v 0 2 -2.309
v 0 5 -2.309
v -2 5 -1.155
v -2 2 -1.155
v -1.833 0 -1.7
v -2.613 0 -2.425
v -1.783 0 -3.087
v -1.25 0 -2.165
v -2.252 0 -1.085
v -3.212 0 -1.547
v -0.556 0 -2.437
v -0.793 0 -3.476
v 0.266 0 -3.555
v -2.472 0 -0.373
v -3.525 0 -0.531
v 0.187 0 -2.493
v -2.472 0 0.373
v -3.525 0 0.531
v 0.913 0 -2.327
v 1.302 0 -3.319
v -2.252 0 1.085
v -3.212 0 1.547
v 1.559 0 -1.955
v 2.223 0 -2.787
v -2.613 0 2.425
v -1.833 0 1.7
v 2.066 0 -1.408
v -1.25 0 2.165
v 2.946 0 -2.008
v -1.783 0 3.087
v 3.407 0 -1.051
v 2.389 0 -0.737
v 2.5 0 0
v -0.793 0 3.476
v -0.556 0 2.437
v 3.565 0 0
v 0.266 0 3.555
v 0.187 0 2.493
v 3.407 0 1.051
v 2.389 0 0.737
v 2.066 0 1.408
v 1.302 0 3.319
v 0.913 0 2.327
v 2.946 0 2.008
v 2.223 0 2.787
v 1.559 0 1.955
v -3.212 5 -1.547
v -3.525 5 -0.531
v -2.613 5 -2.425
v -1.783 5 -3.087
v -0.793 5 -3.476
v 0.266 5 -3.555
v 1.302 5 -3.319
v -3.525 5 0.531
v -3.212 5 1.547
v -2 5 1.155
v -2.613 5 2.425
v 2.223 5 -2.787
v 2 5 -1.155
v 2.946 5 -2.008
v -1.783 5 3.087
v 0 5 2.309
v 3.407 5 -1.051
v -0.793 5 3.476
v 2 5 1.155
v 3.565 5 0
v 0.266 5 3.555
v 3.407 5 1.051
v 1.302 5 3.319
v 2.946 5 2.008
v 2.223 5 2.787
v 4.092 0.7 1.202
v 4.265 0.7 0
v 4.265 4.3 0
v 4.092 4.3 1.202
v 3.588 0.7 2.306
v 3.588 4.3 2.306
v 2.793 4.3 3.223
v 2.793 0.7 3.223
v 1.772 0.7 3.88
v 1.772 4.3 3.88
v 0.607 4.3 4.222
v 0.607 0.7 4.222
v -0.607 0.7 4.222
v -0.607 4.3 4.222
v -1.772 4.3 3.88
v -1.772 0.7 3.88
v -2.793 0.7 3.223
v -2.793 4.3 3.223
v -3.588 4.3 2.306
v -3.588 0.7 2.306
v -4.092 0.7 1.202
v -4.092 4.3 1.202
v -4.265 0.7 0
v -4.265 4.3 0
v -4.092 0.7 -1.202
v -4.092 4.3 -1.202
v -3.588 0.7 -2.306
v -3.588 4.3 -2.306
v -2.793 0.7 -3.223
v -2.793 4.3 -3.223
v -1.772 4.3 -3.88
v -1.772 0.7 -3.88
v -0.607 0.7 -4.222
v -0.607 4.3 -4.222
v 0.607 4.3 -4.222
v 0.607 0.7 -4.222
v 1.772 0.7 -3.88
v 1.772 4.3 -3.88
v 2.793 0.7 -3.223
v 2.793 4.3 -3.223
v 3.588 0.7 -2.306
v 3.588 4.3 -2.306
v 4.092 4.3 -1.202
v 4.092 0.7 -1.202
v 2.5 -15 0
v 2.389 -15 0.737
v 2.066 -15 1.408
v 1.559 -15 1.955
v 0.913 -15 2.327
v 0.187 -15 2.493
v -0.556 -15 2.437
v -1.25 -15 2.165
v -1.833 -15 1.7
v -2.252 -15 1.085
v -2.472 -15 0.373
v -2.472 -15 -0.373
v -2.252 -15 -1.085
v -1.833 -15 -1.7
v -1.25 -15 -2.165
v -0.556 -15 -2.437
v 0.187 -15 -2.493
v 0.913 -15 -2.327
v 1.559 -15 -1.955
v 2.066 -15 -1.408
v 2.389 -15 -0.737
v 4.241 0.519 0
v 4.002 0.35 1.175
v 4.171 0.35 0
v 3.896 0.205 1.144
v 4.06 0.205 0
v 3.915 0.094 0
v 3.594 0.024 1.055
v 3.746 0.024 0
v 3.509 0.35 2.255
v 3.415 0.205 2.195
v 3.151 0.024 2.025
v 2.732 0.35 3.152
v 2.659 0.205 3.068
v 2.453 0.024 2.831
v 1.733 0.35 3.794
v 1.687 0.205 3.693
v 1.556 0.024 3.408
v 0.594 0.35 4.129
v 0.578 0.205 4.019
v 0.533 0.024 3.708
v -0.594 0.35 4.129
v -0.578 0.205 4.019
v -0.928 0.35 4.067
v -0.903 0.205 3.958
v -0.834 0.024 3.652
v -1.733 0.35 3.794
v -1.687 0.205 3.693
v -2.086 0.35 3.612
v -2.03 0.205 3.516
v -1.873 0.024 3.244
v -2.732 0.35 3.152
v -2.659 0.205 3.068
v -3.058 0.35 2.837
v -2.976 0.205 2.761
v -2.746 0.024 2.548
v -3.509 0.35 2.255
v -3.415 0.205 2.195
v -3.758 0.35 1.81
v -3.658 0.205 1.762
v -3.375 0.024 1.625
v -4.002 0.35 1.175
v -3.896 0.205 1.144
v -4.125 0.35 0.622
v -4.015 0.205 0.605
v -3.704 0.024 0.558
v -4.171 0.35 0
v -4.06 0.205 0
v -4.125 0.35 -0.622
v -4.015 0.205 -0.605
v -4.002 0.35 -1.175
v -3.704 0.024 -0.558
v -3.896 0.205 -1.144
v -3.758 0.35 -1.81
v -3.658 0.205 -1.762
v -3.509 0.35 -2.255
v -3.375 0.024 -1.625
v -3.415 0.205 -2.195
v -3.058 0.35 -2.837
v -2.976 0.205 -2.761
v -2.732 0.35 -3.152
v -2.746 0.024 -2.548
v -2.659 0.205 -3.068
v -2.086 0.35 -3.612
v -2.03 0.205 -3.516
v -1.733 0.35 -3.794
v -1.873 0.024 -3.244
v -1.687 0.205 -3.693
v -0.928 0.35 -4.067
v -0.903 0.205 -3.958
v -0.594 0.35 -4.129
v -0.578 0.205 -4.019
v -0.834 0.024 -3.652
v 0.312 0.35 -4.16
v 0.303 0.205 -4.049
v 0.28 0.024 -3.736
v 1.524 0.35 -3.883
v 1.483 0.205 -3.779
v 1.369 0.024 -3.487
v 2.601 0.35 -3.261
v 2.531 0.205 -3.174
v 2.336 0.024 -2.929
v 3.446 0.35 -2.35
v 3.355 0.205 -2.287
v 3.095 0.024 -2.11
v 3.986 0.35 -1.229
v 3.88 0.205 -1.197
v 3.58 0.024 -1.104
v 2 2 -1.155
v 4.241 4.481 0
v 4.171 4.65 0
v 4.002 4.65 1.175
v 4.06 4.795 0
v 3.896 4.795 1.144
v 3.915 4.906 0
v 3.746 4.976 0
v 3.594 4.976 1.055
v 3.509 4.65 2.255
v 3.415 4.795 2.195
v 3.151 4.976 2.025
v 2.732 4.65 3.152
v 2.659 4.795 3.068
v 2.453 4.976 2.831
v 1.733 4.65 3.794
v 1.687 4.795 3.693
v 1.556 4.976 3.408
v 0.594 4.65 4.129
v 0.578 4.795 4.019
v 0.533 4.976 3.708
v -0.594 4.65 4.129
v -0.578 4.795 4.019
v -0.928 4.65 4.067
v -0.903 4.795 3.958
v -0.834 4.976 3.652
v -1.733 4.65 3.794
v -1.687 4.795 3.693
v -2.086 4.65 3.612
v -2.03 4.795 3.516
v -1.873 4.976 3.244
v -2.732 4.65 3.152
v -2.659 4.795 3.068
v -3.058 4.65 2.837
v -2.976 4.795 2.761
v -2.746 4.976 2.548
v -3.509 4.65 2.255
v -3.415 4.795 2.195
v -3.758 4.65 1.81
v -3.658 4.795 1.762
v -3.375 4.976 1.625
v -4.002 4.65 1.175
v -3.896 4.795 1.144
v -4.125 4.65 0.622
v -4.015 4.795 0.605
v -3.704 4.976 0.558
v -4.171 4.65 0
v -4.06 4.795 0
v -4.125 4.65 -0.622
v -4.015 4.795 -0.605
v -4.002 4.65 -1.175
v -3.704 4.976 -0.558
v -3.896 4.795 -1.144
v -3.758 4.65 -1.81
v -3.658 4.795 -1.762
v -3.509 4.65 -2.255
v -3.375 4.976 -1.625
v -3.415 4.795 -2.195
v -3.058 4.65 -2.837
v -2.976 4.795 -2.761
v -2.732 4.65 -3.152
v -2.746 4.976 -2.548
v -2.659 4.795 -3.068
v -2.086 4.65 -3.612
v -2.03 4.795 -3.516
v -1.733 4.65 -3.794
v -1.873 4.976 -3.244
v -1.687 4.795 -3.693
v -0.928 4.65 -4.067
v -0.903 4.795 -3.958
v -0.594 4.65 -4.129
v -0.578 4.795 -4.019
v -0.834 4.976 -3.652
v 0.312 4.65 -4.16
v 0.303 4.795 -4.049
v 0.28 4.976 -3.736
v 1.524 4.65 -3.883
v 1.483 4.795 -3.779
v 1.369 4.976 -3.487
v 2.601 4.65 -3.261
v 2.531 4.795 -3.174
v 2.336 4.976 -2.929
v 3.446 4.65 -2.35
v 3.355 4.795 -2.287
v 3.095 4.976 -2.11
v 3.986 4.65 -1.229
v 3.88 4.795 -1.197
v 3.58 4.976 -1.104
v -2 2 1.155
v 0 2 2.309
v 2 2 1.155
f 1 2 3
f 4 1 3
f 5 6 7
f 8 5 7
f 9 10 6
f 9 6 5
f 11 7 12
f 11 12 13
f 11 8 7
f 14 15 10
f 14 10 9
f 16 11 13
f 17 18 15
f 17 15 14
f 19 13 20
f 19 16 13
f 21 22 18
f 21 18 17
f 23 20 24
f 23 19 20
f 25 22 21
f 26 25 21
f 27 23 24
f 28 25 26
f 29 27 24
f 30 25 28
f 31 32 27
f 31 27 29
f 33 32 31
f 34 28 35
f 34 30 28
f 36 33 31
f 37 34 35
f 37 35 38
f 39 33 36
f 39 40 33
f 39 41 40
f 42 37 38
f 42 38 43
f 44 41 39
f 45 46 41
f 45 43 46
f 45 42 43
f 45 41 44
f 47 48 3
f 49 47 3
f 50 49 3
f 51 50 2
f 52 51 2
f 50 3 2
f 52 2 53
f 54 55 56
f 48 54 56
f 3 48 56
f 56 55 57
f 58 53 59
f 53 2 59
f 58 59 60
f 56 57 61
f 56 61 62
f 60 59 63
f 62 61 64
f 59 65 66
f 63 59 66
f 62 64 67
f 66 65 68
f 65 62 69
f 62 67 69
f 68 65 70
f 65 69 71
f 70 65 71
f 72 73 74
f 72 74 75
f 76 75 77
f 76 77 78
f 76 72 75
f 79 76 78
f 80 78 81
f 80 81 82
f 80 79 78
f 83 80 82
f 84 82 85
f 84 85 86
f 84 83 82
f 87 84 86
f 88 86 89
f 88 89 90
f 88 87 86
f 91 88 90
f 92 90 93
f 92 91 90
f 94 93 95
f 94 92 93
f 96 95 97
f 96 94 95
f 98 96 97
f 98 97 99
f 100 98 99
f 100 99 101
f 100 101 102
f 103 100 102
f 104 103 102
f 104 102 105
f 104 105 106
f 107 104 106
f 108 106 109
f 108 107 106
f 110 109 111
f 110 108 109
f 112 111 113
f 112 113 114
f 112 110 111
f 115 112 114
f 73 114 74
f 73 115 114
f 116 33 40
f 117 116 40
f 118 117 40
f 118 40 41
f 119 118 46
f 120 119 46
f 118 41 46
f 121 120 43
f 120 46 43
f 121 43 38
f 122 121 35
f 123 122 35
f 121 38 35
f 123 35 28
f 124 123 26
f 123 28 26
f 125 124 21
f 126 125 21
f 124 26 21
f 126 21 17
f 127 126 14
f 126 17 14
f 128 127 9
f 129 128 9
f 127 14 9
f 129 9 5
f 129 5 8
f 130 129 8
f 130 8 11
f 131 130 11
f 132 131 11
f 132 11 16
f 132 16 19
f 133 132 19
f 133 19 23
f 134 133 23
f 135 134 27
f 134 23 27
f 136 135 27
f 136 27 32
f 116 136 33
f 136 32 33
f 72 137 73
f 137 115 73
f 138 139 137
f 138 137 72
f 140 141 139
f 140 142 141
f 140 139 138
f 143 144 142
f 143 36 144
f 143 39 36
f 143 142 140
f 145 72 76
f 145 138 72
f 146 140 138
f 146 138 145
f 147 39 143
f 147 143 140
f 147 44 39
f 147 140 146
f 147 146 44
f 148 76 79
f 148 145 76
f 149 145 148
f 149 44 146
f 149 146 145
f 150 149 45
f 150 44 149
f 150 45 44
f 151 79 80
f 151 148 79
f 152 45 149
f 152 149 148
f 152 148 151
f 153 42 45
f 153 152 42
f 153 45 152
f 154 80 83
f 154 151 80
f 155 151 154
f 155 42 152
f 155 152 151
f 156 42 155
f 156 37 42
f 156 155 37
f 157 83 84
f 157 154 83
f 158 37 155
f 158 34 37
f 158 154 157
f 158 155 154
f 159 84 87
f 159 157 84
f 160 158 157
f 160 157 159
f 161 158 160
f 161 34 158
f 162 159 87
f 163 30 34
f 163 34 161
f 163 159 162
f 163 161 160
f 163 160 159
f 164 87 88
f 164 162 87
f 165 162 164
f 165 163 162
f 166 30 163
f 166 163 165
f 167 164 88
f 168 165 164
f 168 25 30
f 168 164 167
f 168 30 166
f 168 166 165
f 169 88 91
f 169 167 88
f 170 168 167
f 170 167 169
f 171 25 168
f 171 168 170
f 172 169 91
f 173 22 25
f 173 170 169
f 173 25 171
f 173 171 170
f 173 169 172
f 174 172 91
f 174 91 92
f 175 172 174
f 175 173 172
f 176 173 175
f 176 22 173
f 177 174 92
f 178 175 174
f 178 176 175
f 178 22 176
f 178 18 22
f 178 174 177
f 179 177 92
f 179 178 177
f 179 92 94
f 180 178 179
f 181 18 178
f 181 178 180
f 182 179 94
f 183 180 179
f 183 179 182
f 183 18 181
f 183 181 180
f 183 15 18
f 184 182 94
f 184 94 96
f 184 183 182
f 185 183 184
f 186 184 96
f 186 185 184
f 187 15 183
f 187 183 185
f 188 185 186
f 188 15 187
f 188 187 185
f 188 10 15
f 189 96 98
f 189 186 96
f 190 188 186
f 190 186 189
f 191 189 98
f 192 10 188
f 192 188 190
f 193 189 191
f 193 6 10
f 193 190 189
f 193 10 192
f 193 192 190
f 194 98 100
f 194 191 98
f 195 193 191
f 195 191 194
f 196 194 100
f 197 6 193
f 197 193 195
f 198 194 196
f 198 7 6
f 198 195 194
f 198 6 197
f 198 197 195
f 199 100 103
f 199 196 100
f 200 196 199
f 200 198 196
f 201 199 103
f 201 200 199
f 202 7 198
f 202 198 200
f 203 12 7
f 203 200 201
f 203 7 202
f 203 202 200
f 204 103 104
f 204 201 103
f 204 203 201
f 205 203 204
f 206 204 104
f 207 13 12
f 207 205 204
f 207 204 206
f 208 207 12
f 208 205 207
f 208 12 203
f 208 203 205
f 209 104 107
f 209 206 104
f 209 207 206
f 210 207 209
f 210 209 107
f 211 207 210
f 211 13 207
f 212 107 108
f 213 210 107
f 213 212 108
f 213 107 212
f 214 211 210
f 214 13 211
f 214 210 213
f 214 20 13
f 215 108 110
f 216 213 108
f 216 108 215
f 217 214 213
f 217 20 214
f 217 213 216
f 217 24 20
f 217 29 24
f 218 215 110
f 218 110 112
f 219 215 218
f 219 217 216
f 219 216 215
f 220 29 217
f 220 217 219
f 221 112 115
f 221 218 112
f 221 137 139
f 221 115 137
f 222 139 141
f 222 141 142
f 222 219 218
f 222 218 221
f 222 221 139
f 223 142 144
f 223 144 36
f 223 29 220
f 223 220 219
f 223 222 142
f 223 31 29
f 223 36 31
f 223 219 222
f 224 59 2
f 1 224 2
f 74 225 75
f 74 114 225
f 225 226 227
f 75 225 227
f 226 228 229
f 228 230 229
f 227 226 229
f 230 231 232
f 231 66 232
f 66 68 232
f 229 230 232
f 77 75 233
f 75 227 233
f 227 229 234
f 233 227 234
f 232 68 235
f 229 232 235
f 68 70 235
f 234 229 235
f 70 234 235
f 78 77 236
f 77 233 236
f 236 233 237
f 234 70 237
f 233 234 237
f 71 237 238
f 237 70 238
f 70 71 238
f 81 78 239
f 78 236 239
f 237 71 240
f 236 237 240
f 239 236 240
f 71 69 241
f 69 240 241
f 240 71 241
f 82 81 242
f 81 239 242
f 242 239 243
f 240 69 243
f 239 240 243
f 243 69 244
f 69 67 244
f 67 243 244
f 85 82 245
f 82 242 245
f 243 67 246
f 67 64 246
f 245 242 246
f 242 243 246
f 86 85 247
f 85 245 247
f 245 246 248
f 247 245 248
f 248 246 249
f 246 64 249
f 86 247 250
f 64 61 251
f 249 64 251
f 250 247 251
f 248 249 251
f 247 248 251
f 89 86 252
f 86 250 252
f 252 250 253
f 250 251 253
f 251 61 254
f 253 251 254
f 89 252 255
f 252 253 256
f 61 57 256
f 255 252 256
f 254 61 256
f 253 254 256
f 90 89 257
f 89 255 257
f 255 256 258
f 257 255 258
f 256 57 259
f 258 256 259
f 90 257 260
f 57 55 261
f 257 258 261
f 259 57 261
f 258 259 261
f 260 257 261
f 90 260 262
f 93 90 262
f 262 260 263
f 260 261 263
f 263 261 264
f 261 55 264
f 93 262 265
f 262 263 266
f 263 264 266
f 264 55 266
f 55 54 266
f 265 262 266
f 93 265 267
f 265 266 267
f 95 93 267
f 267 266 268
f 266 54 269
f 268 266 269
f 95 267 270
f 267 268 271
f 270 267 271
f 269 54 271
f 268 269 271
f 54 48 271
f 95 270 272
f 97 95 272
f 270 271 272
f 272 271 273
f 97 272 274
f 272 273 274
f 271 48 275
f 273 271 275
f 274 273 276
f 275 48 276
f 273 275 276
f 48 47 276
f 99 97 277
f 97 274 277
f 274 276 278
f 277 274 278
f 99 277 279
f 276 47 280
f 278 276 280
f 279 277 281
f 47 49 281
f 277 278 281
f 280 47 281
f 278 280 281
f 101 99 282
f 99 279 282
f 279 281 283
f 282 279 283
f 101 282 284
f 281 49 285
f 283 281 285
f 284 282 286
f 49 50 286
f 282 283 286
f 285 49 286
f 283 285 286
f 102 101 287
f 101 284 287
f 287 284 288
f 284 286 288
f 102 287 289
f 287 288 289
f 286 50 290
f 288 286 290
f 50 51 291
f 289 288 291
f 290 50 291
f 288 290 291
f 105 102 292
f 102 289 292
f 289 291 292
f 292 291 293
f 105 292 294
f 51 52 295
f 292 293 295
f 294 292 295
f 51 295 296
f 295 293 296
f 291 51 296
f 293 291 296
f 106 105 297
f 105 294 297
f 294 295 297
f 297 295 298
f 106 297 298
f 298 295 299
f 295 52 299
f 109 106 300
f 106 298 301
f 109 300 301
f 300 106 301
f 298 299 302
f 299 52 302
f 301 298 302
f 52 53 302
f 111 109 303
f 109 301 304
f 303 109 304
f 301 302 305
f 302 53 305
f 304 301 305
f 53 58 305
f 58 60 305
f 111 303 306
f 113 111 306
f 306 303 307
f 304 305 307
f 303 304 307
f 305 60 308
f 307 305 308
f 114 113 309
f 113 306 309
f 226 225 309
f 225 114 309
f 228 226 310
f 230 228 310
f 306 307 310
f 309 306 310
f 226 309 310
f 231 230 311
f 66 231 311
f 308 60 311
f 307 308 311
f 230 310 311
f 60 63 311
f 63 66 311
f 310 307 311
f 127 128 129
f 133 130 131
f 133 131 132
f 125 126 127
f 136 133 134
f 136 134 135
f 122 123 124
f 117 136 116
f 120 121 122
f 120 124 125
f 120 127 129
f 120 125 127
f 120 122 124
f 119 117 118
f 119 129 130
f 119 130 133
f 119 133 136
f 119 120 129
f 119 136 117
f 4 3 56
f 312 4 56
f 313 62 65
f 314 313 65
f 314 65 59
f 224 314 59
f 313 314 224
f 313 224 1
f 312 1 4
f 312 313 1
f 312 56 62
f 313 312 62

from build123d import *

# Parameters (mm, degrees)
F0_R     = 2.5
F1_DEPTH = 15
F0_R_2   = 4.265
F2_DEPTH = 5
F4_DEPTH = 3
F5_R     = 0.7


with BuildPart() as f1:
    # F0 (on Front) → F1 (new body)
    with BuildSketch(Plane.XZ):
        Circle(F0_R)
    extrude(amount=F1_DEPTH)

    # F0 (on Front) → F2 (join)
    with BuildSketch(Plane.XZ):
        Circle(F0_R_2)
        Circle(F0_R, mode=Mode.SUBTRACT)
        Circle(F0_R)
    extrude(amount=-F2_DEPTH)

    # F3 (on face) → F4 (cut)
    with BuildSketch(Plane(origin=(0, 5, 0), x_dir=(-1, 0, 0), z_dir=(0, 1, 0))):
        Polygon((2, 1.154701), (0, 2.309401), (-2, 1.154701), (-2, -1.154701), (0, -2.309401), (2, -1.154701), align=None)
    extrude(amount=-F4_DEPTH, mode=Mode.SUBTRACT)

    # F5
    f5_edges = [f1.edges().sort_by_distance(p)[0] for p in [
        (-4.265, 5, 0),
        (-4.265, 0, 0),
    ]]
    fillet(f5_edges, radius=F5_R)


solid = f1.part
